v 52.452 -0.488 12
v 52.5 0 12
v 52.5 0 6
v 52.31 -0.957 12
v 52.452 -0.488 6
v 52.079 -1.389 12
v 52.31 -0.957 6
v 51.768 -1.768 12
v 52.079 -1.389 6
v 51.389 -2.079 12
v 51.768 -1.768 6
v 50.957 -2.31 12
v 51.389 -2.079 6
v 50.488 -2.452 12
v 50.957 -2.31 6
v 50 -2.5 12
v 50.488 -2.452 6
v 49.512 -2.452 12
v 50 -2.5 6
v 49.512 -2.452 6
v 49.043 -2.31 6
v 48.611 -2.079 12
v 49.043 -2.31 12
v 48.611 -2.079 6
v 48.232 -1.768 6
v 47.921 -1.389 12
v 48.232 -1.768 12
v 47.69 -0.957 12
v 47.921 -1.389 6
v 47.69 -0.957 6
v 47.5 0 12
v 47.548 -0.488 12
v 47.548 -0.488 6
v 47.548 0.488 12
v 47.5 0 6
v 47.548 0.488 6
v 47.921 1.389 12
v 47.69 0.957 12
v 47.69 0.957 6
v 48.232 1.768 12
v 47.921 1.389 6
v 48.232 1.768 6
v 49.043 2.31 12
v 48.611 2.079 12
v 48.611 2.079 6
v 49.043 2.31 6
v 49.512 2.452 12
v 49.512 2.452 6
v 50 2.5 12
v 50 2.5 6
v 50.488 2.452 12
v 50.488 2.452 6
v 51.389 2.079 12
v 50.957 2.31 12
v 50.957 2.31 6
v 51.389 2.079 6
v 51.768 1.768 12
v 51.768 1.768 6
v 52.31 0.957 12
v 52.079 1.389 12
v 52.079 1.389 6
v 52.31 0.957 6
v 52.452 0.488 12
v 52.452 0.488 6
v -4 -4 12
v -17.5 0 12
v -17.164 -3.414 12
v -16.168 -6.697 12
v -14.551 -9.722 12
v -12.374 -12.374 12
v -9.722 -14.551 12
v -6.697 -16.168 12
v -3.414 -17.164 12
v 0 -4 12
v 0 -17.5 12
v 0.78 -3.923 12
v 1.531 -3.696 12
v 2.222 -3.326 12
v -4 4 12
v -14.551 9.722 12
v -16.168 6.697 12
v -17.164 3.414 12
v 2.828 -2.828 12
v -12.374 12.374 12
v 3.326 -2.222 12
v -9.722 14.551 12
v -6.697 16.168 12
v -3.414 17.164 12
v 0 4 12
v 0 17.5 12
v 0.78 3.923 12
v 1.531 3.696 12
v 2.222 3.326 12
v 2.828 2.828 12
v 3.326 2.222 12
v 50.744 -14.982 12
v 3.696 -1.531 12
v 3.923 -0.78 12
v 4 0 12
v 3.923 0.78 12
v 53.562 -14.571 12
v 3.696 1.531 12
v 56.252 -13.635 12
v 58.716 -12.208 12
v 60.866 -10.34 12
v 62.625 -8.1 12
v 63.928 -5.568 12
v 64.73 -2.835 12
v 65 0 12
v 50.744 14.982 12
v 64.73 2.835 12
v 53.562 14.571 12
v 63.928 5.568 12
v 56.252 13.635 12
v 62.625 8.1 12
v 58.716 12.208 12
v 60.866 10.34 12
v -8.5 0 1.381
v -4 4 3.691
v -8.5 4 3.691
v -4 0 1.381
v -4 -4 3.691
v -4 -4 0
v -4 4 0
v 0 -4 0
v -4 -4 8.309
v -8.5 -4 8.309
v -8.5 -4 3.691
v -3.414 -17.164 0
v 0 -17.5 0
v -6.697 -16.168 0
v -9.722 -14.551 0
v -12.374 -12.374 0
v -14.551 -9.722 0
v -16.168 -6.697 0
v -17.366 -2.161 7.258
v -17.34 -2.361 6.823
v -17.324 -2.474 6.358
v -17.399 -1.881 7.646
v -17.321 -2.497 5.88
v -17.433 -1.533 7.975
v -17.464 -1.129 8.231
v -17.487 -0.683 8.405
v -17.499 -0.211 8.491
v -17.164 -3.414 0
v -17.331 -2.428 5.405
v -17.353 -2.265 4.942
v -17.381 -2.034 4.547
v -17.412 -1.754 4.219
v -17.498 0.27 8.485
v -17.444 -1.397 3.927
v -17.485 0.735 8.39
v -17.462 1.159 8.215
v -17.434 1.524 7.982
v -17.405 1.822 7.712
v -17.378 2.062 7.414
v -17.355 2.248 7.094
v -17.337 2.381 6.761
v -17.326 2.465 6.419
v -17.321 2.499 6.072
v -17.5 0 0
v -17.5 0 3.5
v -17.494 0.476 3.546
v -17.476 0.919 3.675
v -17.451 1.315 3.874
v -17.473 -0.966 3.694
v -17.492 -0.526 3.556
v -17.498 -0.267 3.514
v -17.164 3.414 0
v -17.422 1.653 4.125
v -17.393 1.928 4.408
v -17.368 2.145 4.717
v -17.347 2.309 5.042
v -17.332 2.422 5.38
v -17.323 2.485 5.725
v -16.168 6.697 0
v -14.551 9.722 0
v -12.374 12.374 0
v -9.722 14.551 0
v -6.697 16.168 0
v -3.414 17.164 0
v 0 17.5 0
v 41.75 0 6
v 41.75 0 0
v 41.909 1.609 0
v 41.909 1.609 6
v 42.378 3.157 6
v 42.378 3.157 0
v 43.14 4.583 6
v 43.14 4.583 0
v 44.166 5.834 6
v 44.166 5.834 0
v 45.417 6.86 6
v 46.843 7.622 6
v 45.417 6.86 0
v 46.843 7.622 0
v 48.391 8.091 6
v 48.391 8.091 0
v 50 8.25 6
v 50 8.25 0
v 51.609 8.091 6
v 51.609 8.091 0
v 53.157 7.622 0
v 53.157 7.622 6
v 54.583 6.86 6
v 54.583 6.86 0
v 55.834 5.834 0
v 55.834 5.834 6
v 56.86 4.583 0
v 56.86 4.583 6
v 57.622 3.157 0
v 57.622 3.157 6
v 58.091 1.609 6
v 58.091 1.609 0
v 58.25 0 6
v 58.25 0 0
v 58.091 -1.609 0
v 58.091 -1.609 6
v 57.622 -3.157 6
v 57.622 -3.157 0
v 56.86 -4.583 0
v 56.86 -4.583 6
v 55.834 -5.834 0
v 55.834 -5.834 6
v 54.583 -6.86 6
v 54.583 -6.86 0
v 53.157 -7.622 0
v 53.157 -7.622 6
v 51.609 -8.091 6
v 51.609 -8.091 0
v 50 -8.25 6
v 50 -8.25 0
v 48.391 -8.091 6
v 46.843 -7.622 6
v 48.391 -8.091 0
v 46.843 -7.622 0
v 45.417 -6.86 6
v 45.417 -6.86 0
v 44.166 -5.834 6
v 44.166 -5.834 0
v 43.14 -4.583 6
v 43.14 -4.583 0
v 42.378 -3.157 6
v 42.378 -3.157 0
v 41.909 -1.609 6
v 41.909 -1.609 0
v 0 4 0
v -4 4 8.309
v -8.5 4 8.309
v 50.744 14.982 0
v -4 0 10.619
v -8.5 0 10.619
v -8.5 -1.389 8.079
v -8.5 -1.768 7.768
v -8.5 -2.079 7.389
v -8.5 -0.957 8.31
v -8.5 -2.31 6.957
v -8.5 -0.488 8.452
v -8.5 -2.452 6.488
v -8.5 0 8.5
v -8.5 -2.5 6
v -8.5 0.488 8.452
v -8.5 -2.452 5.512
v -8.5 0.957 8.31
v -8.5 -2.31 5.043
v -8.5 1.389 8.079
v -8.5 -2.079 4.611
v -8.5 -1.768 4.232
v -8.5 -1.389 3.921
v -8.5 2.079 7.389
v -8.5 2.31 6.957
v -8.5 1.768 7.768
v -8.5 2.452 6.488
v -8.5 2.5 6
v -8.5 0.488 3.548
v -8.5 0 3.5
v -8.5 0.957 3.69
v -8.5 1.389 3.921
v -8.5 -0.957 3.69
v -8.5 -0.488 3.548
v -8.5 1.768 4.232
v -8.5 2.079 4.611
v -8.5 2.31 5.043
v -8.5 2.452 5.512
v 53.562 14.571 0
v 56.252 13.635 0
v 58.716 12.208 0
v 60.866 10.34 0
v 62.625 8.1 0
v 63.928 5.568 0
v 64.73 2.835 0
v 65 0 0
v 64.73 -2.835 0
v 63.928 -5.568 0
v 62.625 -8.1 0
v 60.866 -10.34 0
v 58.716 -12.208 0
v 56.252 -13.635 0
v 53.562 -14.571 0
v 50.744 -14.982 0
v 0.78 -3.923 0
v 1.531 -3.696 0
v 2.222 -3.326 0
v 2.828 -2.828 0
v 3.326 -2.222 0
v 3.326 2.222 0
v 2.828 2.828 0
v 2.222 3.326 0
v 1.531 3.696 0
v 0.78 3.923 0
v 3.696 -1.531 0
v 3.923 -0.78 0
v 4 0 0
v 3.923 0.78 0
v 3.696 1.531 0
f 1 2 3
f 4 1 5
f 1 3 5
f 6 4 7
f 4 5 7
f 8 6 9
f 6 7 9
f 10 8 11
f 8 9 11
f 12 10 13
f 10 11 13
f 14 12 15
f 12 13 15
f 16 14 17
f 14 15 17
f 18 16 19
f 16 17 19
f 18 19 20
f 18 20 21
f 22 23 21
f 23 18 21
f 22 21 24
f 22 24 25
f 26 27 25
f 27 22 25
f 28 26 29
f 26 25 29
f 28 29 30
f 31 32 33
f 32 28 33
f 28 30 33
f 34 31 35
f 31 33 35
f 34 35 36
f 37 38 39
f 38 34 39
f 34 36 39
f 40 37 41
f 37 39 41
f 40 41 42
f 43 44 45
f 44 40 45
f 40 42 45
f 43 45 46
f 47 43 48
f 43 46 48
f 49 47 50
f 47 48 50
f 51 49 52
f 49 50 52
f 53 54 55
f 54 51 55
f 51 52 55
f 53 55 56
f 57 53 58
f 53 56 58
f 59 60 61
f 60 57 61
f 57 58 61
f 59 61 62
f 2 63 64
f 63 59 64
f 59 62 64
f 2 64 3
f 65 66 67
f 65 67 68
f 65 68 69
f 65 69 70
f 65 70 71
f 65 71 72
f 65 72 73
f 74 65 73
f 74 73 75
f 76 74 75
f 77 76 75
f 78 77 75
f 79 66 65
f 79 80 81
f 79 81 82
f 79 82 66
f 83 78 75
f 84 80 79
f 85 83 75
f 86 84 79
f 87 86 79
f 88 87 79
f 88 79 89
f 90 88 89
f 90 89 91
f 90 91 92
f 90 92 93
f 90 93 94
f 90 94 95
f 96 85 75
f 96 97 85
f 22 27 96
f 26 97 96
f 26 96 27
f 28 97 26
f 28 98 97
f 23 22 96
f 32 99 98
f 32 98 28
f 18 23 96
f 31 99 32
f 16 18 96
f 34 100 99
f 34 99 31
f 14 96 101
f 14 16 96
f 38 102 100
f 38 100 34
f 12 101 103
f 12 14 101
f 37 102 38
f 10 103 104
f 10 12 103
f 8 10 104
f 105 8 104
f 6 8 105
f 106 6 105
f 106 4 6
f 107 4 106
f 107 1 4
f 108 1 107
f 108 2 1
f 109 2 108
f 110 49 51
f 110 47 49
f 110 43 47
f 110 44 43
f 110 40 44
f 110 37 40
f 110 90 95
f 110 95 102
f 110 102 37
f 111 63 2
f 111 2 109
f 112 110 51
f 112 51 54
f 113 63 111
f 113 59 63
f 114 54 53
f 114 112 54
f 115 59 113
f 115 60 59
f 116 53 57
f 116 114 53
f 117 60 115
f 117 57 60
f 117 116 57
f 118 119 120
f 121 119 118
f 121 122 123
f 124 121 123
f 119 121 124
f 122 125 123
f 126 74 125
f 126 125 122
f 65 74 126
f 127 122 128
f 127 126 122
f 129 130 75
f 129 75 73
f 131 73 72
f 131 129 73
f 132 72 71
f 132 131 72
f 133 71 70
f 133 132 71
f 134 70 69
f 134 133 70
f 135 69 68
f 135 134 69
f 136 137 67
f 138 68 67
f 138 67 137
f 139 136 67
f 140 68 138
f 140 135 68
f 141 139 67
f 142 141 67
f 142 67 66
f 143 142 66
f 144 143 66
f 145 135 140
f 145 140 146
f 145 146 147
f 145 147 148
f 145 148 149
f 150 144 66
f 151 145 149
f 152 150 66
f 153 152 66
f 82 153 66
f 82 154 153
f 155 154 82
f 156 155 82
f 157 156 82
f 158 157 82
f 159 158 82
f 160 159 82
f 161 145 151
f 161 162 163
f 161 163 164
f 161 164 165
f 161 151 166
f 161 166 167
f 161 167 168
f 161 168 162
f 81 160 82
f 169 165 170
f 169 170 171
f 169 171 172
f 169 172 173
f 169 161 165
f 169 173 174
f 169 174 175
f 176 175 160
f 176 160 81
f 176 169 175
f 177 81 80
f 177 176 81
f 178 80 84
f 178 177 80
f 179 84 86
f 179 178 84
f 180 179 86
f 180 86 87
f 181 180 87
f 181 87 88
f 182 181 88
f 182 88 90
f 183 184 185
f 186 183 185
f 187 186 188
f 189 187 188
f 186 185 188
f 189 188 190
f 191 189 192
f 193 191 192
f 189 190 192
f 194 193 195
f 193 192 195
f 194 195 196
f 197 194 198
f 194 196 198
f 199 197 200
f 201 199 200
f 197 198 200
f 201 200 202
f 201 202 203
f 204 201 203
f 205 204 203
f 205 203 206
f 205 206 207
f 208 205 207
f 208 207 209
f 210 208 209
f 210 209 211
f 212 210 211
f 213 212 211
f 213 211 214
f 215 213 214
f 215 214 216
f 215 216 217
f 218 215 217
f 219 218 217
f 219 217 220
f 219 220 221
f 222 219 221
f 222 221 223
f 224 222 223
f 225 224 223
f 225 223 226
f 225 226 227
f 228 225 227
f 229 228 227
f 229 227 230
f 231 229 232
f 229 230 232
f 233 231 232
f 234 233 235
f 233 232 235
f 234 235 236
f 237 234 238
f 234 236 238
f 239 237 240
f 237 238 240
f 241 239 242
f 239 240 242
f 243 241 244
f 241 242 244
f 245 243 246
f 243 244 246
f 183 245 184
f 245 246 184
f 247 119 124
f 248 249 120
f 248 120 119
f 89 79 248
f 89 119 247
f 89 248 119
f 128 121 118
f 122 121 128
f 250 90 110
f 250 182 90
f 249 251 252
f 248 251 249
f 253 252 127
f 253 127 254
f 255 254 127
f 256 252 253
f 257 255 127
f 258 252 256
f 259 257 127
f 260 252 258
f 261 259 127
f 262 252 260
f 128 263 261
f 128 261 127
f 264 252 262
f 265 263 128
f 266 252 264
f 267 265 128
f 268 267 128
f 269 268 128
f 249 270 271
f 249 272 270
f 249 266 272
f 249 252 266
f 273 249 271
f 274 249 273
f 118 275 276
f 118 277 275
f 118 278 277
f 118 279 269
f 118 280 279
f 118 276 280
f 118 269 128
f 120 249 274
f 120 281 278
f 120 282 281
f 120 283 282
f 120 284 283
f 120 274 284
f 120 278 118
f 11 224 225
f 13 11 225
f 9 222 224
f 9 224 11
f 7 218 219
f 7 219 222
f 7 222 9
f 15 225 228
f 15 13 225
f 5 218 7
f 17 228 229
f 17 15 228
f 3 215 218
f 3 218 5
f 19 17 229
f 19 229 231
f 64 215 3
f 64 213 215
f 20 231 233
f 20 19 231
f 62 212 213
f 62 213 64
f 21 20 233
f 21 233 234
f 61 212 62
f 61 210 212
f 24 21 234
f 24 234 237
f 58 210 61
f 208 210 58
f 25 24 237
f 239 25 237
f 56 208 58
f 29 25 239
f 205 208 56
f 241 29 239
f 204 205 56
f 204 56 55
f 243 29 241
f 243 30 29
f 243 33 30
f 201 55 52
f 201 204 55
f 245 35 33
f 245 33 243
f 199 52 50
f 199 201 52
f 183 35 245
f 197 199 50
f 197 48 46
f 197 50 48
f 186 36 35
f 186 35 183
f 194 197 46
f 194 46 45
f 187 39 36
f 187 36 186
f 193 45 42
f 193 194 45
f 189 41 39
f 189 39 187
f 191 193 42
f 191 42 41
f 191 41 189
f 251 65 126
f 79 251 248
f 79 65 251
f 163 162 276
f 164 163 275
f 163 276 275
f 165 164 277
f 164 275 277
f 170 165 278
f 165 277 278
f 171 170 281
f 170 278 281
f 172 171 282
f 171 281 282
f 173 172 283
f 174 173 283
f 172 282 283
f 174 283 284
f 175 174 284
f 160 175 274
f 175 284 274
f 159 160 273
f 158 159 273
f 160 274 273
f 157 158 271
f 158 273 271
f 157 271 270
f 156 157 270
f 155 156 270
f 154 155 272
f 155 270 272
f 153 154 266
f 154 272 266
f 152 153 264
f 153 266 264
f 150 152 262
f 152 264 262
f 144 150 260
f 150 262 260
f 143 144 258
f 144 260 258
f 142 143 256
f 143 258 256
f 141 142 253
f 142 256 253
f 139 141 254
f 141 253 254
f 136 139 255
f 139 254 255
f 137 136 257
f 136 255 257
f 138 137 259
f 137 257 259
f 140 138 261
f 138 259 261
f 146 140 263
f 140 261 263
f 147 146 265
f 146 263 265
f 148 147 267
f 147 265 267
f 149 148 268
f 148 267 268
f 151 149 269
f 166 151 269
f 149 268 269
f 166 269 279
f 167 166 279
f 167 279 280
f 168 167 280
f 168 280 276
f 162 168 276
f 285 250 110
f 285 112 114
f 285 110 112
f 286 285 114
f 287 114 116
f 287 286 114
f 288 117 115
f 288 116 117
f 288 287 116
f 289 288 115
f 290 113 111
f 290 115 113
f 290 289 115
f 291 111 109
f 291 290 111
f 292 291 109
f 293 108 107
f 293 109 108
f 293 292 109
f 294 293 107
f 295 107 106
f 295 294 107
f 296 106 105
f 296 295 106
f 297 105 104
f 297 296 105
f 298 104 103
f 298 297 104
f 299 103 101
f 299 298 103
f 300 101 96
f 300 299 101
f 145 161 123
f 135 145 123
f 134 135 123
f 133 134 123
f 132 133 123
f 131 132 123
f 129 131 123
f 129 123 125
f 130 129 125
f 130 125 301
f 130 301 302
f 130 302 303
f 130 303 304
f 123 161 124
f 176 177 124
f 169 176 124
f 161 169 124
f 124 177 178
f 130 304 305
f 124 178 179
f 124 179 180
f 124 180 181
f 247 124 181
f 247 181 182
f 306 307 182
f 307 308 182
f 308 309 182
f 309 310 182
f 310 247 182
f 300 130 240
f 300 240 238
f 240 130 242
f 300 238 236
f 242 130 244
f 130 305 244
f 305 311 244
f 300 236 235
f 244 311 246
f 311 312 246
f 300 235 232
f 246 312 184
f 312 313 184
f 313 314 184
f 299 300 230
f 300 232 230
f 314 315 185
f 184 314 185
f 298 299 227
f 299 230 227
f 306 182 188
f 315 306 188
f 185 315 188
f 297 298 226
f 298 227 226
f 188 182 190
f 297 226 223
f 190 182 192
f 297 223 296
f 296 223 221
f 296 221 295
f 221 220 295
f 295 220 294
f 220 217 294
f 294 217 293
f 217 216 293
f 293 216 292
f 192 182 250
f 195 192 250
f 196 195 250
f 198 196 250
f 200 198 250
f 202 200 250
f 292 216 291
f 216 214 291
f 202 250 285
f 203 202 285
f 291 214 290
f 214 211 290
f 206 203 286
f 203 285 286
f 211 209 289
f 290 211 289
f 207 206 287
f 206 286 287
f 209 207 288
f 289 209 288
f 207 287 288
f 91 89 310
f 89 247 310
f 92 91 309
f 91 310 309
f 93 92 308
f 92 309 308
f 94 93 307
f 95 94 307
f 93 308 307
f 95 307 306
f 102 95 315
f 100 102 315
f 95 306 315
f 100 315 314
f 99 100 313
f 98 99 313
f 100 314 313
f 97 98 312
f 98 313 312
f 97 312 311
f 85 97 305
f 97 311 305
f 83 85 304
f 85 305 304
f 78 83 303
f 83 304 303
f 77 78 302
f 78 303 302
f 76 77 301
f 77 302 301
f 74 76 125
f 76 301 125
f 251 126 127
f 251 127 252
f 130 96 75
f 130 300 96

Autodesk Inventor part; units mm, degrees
ref_plane "YZ Plane" through (0, 0, 0) normal (1, 0, 0) x (0, 1, 0)
ref_plane "XZ Plane" through (0, 0, 0) normal (0, 1, 0) x (-1, 0, 0)
ref_plane "XY Plane" through (0, 0, 0) normal (0, 0, 1) x (1, 0, 0)
sketch "Sketch1" plane through (0, 0, 0) normal (0, 0, 1) x (1, 0, 0)
  circle A0 centre (0, 0) radius 4
  arc A1 (0, 17.5) -> (0, -17.5) centre (0, 0) ccw
  arc A2 (50.7435, -14.9816) -> (50.7435, 14.9816) centre (50, 0) ccw
  line L0 (0, 17.5) -> (50.7435, 14.9816)
  line L1 (50.7435, -14.9816) -> (0, -17.5)
  circle A3 centre (50, 0) radius 2.5
  point P0 (1.8995, -17.4057)
  point P1 (1.8995, 17.4057)
  dimension "d0" = 8
  dimension "d1" = 35
  dimension "d2" = 30
  dimension "d3" = 50
  dimension "d4" = 0
  dimension "d5" = 5
extrude "Extrusion1" add sketch "Sketch1" along normal blind 12
sketch "Sketch7" plane through (0, 0, 0) normal (0, 0, -1) x (-1, 0, 0)
  circle A0 centre (-50, 0) radius 2.5 projected
  arc A1 (-50.7435, 14.9816) -> (-50.7435, -14.9816) centre (-50, 0) ccw projected
  circle A2 centre (-50, 0) radius 8.25
  dimension "d23" = 16.5
extrude "Extrusion7" cut sketch "Sketch7" against normal blind 6
sketch "Sketch8" plane through (0, 0, 12) normal (0, 0, 1) x (1, 0, 0)
  circle A0 centre (0, 0) radius 4 projected
  line L0 (-4, 4) -> (0, 4)
  line L1 (0, 4) -> (0, -4)
  line L2 (0, -4) -> (-4, -4)
  line L3 (-4, -4) -> (-4, 4)
  dimension "d26" = 8
  dimension "d27" = 4
extrude "Extrusion8" cut sketch "Sketch8" against normal through all contours L1 A0 | A0 L3 L0 | L2 L3 A0 picked at (-0.5785, -1.2013)
sketch "Sketch9" plane through (-4, -4, 12) normal (1, 0, 0) x (0, 0, -1)
  circle A0 centre (6, 4) radius 2.5
  point P0 (12, 4)
  dimension "d30" = 5
extrude "Extrusion9" cut sketch "Sketch9" against normal through all
sketch "Sketch10" plane through (-4, -4, 12) normal (1, 0, 0) x (0, 0, -1)
  circle A0 centre (6, 4) radius 2.5 projected
  line L0 (1.3812, 4) -> (3.6906, 8)
  line L1 (3.6906, 8) -> (8.3094, 8)
  line L2 (8.3094, 8) -> (10.6188, 4)
  line L3 (10.6188, 4) -> (8.3094, 0)
  line L4 (8.3094, 0) -> (3.6906, 0)
  line L5 (3.6906, 0) -> (1.3812, 4)
  point P0 (12, 4)
  dimension "d33" = 8
extrude "Extrusion10" cut sketch "Sketch10" against normal blind 4.5
properties part number "20013" material "ABS Plastic"
